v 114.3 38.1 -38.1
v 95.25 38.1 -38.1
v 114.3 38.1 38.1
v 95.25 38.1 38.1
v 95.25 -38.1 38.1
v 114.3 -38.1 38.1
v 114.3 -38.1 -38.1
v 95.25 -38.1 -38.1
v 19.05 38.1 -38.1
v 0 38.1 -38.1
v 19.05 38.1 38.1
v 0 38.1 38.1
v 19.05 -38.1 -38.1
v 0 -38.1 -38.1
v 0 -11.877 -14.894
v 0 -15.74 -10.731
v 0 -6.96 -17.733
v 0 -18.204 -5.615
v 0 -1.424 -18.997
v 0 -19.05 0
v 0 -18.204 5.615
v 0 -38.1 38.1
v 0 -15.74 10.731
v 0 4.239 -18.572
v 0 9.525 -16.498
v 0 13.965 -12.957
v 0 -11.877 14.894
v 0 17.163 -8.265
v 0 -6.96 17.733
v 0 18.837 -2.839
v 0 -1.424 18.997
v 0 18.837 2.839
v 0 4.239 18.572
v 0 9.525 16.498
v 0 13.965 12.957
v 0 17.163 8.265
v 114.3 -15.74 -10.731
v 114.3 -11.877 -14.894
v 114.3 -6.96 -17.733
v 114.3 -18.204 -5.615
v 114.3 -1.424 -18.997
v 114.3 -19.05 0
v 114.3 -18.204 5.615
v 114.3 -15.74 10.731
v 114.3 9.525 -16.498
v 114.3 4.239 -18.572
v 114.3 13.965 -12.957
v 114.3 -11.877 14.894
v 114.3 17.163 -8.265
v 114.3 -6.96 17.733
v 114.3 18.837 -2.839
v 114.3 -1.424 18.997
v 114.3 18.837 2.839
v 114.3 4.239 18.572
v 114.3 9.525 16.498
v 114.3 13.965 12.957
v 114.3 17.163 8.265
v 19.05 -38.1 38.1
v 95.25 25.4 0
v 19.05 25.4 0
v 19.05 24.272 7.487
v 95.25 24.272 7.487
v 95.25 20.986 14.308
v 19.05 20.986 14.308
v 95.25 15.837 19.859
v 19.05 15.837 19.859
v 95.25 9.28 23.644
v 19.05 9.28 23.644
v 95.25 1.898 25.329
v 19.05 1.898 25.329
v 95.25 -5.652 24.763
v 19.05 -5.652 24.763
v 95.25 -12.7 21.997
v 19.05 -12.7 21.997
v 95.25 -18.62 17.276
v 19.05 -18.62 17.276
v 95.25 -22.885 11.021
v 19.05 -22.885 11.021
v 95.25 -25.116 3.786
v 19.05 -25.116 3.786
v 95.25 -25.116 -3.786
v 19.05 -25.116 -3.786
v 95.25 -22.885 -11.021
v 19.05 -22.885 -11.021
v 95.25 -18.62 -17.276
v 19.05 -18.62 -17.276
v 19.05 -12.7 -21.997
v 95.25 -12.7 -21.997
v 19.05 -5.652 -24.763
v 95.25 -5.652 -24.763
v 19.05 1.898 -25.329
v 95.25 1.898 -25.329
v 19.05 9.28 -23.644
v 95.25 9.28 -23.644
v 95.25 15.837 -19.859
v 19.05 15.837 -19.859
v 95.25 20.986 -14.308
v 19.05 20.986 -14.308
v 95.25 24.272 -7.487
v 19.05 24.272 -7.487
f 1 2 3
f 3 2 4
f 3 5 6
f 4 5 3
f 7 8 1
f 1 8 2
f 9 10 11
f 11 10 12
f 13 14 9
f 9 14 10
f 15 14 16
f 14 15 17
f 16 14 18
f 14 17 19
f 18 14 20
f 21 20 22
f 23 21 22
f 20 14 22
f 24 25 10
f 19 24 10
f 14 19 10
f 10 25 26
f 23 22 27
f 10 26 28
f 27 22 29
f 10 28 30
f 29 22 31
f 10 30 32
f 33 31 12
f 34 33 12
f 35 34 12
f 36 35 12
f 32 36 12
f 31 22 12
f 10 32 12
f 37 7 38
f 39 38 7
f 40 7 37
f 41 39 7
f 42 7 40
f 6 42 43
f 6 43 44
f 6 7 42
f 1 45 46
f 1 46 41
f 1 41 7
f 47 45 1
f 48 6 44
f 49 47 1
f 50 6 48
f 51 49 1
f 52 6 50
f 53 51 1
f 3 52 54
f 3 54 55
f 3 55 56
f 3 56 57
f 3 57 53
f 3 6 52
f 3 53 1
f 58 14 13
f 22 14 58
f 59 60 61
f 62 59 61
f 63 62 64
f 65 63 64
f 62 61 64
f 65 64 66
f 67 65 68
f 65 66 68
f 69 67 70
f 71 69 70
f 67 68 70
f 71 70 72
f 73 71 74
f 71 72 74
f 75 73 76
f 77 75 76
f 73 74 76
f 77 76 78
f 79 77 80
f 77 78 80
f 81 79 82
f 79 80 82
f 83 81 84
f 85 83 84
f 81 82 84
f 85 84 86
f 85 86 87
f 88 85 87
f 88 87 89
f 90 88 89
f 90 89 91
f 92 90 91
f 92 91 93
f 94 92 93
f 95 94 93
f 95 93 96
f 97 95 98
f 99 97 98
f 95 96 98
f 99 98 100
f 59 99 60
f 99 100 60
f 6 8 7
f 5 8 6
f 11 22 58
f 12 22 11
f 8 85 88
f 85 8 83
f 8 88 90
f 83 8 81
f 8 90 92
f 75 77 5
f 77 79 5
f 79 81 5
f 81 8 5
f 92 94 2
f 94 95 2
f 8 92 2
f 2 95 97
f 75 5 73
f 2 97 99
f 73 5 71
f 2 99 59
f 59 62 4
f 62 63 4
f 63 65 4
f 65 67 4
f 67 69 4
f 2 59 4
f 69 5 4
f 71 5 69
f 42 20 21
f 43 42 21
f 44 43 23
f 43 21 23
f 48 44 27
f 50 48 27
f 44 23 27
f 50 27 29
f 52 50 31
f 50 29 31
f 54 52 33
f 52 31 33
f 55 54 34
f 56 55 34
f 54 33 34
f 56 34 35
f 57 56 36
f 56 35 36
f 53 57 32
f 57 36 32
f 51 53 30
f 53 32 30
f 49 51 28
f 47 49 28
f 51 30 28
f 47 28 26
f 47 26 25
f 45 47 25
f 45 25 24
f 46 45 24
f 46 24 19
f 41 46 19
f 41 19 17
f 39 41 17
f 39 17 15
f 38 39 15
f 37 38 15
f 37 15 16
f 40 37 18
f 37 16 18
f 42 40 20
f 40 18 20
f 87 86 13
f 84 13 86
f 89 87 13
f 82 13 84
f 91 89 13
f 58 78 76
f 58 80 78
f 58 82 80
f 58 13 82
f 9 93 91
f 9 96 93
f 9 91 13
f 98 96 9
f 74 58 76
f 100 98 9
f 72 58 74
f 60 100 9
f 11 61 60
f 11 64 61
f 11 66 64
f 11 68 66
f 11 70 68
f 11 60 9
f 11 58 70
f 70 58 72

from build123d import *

# Parameters (mm, degrees)
F0_W     = 76.2
F0_H     = 76.2
F1_DEPTH = 19.05
F2_R     = 25.4
F3_DEPTH = 76.2
F4_W     = 76.2
F4_H     = 76.2
F4_R     = 25.4
F5_DEPTH = 19.05
F6_R     = 19.05
F7_DEPTH = 114.3


with BuildPart() as f1:
    # F0 (on Right) → F1 (new body)
    with BuildSketch(Plane.YZ):
        Rectangle(F0_W, F0_H)
    extrude(amount=F1_DEPTH)

    # F2 (on face) → F3 (join)
    with BuildSketch(Plane.YZ.offset(19.05)):
        Circle(F2_R)
    extrude(amount=F3_DEPTH)

    # F4 (on face) → F5 (join)
    with BuildSketch(Plane.YZ.offset(95.25)):
        Rectangle(F4_W, F4_H)
        Circle(F4_R, mode=Mode.SUBTRACT)
        Circle(F4_R)
    extrude(amount=F5_DEPTH)

    # F6 (on face) → F7 (cut)
    with BuildSketch(Plane(origin=(0, 0, 0), x_dir=(0, -1, 0), z_dir=(-1, 0, 0))):
        Circle(F6_R)
    extrude(amount=-F7_DEPTH, mode=Mode.SUBTRACT)


solid = f1.part
